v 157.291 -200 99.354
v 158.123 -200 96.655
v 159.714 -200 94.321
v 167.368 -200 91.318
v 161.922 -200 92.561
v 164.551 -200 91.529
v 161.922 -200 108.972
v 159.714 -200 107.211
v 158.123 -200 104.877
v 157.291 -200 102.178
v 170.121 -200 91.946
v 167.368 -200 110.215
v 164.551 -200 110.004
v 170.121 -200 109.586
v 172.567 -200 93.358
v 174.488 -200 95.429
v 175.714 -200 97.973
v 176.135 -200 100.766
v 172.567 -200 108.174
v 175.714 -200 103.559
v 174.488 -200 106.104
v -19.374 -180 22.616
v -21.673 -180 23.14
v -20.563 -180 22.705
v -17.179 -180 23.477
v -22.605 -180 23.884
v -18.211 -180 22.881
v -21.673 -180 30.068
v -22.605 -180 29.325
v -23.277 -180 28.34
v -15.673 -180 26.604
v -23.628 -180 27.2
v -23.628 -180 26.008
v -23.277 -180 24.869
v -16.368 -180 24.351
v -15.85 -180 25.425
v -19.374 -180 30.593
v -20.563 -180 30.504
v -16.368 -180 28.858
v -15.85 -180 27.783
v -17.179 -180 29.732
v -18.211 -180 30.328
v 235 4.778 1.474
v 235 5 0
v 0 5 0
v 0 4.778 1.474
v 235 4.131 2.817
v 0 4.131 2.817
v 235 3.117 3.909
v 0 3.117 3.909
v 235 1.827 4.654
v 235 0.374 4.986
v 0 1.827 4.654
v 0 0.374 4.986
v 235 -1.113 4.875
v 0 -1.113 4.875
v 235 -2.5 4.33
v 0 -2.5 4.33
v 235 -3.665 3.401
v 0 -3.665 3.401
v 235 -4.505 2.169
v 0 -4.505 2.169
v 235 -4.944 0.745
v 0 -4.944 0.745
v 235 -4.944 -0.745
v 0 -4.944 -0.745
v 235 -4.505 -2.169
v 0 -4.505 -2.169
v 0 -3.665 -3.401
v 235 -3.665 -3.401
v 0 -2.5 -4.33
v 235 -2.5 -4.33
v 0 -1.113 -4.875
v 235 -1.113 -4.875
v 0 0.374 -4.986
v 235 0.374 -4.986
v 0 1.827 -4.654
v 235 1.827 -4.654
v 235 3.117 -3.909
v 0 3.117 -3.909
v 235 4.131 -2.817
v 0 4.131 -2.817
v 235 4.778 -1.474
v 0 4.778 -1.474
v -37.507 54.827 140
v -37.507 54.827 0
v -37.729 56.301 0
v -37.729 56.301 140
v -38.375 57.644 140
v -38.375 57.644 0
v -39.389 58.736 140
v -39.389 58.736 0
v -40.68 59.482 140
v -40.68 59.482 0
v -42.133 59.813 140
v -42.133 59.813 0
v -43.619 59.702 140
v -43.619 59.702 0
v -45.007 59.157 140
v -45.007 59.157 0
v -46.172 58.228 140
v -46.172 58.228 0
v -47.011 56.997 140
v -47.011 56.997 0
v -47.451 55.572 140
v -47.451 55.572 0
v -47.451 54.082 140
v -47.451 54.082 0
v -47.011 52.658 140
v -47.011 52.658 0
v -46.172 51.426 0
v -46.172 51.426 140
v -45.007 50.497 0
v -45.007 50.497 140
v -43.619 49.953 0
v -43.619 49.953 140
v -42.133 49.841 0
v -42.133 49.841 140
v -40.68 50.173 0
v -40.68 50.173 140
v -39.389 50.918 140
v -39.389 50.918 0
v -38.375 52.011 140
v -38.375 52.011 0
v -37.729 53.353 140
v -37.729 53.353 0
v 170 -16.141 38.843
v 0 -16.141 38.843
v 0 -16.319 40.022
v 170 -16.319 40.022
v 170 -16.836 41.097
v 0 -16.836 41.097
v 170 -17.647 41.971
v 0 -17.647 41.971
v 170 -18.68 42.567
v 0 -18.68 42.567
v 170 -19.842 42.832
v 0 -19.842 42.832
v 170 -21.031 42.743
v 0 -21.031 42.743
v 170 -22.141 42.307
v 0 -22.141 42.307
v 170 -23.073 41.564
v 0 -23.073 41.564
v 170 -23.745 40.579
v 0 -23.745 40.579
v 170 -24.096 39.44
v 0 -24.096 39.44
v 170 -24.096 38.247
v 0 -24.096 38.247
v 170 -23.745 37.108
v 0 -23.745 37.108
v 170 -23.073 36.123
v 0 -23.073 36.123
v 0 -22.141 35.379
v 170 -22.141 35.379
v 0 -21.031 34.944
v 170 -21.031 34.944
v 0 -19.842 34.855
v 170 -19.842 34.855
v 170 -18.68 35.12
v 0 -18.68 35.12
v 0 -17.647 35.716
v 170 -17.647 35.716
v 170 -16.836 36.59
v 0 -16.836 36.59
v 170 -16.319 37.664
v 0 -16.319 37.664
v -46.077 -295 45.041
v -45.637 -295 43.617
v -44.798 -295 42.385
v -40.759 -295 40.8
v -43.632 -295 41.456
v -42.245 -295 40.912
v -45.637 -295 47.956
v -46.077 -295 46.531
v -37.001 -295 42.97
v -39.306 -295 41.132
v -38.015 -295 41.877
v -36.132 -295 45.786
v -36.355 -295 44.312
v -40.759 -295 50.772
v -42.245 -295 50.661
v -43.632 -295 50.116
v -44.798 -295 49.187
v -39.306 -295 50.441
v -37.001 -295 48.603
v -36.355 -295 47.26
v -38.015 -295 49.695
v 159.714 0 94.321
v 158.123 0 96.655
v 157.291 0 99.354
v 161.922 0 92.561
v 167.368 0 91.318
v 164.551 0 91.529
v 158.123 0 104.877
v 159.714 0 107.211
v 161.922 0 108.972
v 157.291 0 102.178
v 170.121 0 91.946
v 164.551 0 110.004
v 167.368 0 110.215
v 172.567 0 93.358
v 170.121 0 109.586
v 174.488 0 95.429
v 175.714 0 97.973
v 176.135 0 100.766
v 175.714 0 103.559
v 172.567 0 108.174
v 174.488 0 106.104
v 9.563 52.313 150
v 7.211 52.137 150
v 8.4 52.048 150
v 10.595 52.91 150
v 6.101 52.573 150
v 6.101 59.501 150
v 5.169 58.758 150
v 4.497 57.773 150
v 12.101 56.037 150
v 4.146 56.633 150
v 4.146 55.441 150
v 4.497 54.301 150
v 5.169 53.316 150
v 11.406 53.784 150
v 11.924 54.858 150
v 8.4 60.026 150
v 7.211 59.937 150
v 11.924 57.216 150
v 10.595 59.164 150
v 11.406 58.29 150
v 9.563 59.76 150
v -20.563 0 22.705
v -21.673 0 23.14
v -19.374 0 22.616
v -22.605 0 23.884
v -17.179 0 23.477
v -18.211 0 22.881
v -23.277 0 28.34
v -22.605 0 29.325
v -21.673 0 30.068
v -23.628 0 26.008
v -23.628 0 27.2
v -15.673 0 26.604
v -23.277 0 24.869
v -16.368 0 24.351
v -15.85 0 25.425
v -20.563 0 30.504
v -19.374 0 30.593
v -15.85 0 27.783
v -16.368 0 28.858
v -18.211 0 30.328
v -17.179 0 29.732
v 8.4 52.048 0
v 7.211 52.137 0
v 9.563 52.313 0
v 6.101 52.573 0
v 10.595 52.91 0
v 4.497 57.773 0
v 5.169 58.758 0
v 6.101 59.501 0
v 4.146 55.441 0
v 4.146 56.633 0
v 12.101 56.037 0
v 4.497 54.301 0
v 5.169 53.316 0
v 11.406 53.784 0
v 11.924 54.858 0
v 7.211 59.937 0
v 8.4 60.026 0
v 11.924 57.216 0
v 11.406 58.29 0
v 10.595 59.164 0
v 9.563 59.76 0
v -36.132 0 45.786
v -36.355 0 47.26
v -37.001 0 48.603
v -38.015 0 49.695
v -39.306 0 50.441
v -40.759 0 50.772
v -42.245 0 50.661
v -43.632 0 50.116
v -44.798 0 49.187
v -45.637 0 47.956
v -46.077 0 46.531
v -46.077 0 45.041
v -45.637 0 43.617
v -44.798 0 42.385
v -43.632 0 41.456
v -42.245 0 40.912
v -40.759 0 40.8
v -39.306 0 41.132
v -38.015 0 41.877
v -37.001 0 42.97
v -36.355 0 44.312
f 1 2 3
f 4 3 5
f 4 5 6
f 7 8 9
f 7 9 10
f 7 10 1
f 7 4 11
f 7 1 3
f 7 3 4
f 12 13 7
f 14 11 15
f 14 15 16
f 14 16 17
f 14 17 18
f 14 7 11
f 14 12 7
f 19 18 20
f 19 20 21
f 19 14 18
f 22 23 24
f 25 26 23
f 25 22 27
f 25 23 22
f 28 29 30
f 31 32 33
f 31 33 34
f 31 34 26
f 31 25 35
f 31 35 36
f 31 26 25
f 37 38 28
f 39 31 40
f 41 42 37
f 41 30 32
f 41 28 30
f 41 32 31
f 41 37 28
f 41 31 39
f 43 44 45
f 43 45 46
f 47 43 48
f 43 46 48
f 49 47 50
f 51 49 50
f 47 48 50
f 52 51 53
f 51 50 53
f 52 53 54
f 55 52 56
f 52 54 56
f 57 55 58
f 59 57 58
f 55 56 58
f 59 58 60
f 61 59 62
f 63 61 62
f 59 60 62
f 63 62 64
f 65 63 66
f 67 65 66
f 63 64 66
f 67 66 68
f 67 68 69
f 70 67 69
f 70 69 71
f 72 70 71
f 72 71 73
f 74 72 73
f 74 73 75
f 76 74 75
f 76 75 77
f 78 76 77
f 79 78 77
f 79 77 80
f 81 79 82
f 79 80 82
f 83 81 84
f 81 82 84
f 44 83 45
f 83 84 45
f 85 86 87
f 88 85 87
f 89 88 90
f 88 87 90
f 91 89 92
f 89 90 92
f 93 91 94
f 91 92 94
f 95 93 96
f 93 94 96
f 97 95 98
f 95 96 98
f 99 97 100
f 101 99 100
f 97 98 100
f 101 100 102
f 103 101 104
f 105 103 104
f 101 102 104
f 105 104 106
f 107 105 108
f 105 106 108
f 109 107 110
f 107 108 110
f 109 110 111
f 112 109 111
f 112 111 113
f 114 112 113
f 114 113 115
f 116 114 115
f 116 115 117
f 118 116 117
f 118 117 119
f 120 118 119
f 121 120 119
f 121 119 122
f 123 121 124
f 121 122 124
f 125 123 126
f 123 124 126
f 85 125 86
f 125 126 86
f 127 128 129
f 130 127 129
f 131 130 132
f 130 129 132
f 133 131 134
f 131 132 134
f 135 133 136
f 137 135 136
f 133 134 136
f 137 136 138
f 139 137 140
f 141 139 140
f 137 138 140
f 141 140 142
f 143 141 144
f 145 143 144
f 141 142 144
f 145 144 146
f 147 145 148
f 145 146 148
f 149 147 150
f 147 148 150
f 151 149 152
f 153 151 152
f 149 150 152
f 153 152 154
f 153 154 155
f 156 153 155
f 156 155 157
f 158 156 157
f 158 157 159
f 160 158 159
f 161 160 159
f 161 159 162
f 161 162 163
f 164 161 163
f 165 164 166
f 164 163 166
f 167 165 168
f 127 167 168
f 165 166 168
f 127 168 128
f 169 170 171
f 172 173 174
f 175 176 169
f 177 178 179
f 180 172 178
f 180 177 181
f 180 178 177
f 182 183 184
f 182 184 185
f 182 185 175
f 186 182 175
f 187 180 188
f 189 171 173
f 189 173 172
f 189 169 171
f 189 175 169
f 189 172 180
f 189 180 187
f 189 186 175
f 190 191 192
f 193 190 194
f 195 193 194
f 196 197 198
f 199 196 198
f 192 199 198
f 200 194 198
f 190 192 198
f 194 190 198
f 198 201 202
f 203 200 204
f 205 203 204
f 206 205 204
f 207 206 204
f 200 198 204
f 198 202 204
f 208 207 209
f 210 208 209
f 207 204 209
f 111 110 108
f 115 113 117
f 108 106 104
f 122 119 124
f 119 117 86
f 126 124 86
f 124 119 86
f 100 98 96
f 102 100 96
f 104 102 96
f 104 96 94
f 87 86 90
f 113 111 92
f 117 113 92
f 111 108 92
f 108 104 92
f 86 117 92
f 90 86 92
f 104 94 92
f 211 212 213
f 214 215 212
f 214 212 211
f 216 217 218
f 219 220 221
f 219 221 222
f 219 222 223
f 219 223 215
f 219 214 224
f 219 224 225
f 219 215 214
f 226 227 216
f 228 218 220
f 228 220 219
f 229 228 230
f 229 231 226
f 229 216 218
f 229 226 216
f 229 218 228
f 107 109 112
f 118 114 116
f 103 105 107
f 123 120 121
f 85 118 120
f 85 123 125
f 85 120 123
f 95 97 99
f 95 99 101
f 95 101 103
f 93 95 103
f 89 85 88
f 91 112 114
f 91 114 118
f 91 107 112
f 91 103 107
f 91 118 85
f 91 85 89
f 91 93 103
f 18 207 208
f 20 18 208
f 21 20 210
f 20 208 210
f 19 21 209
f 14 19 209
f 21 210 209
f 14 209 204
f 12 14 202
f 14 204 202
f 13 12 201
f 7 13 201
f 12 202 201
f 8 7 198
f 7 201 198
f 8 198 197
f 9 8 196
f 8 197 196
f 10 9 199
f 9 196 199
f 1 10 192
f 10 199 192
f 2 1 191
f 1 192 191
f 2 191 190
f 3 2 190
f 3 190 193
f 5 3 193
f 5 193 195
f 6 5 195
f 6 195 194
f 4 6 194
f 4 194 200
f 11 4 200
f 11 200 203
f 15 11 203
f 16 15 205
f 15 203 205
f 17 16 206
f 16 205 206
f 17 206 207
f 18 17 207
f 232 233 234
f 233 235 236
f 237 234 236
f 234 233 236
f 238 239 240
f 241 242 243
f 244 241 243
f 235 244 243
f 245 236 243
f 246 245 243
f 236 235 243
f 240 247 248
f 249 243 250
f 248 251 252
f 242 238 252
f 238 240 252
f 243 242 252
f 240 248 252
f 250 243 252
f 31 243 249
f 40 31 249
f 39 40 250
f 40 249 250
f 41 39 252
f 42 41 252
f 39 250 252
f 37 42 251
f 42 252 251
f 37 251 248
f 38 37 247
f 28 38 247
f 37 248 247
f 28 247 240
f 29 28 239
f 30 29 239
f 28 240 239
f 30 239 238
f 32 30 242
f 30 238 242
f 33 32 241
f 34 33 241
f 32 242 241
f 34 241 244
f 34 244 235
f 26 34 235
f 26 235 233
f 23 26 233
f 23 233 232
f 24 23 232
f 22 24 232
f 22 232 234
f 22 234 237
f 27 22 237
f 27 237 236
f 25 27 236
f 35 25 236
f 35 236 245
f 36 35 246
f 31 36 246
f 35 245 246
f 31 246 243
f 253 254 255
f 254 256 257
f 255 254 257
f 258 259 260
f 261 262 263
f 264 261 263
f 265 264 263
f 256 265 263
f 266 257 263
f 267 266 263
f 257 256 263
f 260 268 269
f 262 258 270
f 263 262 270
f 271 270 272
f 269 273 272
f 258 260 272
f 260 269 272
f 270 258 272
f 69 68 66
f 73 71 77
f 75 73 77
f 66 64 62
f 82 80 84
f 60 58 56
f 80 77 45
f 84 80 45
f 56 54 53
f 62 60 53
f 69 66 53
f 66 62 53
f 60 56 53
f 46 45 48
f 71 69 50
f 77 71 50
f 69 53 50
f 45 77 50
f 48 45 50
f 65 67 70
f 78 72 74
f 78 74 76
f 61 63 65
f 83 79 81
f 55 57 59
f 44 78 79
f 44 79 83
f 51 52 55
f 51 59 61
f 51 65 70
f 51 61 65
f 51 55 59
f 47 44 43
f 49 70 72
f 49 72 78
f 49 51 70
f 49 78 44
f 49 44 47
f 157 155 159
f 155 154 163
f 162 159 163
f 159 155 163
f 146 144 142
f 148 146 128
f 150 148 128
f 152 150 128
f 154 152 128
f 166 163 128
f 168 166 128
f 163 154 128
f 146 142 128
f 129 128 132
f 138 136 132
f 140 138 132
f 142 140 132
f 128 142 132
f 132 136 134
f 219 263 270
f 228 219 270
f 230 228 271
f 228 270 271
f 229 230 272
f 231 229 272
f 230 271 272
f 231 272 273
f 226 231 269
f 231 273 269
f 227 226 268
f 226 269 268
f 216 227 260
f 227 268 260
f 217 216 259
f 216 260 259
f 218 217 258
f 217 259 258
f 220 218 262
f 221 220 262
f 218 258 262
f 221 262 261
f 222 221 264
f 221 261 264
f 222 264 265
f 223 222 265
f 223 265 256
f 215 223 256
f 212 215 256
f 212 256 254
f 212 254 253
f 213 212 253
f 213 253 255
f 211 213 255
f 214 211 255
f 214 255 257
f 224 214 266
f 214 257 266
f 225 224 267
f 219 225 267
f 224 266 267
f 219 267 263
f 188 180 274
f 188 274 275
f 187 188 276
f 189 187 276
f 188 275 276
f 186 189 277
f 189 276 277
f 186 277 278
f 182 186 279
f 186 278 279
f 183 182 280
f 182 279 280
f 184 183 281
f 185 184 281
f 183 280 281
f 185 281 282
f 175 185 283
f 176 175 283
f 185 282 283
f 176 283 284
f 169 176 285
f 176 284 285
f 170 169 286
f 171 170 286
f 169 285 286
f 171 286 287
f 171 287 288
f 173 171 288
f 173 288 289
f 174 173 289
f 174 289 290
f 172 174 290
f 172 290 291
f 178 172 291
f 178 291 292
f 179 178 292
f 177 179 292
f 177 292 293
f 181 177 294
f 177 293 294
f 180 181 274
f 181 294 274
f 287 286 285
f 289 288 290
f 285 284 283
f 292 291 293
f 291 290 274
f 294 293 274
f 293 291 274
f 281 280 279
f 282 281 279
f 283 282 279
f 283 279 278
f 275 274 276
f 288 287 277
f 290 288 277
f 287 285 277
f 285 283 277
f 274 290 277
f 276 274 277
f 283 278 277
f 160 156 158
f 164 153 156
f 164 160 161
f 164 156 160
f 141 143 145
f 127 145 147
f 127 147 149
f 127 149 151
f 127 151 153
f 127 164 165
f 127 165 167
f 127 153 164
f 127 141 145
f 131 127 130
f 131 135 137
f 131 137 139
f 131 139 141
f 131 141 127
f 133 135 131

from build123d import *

# Parameters (mm, degrees)
F0_R      = 5
F1_DEPTH  = 235
F2_R      = 5
F3_DEPTH  = 295
F4_R      = 5
F5_DEPTH  = 140
F7_R      = 9.475
F8_DEPTH  = 200
F0_R_2    = 4
F10_DEPTH = 170
F2_R_2    = 4
F11_DEPTH = 180
F4_R_2    = 4
F12_DEPTH = 150


with BuildPart() as f1:
    # F0 (on Right) → F1 (new body)
    with BuildSketch(Plane.YZ):
        Circle(F0_R)
    extrude(amount=F1_DEPTH)


with BuildPart() as f3:
    # F2 (on Front) → F3 (new body)
    with BuildSketch(Plane.XZ):
        with Locations((-41.132472, 45.786221)):
            Circle(F2_R)
    extrude(amount=F3_DEPTH)


with BuildPart() as f5:
    # F4 (on Top) → F5 (new body)
    with BuildSketch(Plane.XY):
        with Locations((-42.50652, 54.827251)):
            Circle(F4_R)
    extrude(amount=F5_DEPTH)


with BuildPart() as f6_1:
    # F6: copy of F1
    add(f1.part)


with BuildPart() as f8:
    # F7 (on Front) → F8 (new body)
    with BuildSketch(Plane.XZ):
        with Locations((166.659728, 100.7661)):
            Circle(F7_R)
    extrude(amount=F8_DEPTH)


with BuildPart() as f10:
    # F0 (on Right) → F10 (new body)
    with BuildSketch(Plane.YZ):
        with Locations((-20.140991, 38.843349)):
            Circle(F0_R_2)
    extrude(amount=F10_DEPTH)


with BuildPart() as f11:
    # F2 (on Front) → F11 (new body)
    with BuildSketch(Plane.XZ):
        with Locations((-19.672709, 26.604321)):
            Circle(F2_R_2)
    extrude(amount=F11_DEPTH)


with BuildPart() as f12:
    # F4 (on Top) → F12 (new body)
    with BuildSketch(Plane.XY):
        with Locations((8.101324, 56.03699)):
            Circle(F4_R_2)
    extrude(amount=F12_DEPTH)


solid = Compound([f1.part, f3.part, f5.part, f8.part, f10.part, f11.part, f12.part])
